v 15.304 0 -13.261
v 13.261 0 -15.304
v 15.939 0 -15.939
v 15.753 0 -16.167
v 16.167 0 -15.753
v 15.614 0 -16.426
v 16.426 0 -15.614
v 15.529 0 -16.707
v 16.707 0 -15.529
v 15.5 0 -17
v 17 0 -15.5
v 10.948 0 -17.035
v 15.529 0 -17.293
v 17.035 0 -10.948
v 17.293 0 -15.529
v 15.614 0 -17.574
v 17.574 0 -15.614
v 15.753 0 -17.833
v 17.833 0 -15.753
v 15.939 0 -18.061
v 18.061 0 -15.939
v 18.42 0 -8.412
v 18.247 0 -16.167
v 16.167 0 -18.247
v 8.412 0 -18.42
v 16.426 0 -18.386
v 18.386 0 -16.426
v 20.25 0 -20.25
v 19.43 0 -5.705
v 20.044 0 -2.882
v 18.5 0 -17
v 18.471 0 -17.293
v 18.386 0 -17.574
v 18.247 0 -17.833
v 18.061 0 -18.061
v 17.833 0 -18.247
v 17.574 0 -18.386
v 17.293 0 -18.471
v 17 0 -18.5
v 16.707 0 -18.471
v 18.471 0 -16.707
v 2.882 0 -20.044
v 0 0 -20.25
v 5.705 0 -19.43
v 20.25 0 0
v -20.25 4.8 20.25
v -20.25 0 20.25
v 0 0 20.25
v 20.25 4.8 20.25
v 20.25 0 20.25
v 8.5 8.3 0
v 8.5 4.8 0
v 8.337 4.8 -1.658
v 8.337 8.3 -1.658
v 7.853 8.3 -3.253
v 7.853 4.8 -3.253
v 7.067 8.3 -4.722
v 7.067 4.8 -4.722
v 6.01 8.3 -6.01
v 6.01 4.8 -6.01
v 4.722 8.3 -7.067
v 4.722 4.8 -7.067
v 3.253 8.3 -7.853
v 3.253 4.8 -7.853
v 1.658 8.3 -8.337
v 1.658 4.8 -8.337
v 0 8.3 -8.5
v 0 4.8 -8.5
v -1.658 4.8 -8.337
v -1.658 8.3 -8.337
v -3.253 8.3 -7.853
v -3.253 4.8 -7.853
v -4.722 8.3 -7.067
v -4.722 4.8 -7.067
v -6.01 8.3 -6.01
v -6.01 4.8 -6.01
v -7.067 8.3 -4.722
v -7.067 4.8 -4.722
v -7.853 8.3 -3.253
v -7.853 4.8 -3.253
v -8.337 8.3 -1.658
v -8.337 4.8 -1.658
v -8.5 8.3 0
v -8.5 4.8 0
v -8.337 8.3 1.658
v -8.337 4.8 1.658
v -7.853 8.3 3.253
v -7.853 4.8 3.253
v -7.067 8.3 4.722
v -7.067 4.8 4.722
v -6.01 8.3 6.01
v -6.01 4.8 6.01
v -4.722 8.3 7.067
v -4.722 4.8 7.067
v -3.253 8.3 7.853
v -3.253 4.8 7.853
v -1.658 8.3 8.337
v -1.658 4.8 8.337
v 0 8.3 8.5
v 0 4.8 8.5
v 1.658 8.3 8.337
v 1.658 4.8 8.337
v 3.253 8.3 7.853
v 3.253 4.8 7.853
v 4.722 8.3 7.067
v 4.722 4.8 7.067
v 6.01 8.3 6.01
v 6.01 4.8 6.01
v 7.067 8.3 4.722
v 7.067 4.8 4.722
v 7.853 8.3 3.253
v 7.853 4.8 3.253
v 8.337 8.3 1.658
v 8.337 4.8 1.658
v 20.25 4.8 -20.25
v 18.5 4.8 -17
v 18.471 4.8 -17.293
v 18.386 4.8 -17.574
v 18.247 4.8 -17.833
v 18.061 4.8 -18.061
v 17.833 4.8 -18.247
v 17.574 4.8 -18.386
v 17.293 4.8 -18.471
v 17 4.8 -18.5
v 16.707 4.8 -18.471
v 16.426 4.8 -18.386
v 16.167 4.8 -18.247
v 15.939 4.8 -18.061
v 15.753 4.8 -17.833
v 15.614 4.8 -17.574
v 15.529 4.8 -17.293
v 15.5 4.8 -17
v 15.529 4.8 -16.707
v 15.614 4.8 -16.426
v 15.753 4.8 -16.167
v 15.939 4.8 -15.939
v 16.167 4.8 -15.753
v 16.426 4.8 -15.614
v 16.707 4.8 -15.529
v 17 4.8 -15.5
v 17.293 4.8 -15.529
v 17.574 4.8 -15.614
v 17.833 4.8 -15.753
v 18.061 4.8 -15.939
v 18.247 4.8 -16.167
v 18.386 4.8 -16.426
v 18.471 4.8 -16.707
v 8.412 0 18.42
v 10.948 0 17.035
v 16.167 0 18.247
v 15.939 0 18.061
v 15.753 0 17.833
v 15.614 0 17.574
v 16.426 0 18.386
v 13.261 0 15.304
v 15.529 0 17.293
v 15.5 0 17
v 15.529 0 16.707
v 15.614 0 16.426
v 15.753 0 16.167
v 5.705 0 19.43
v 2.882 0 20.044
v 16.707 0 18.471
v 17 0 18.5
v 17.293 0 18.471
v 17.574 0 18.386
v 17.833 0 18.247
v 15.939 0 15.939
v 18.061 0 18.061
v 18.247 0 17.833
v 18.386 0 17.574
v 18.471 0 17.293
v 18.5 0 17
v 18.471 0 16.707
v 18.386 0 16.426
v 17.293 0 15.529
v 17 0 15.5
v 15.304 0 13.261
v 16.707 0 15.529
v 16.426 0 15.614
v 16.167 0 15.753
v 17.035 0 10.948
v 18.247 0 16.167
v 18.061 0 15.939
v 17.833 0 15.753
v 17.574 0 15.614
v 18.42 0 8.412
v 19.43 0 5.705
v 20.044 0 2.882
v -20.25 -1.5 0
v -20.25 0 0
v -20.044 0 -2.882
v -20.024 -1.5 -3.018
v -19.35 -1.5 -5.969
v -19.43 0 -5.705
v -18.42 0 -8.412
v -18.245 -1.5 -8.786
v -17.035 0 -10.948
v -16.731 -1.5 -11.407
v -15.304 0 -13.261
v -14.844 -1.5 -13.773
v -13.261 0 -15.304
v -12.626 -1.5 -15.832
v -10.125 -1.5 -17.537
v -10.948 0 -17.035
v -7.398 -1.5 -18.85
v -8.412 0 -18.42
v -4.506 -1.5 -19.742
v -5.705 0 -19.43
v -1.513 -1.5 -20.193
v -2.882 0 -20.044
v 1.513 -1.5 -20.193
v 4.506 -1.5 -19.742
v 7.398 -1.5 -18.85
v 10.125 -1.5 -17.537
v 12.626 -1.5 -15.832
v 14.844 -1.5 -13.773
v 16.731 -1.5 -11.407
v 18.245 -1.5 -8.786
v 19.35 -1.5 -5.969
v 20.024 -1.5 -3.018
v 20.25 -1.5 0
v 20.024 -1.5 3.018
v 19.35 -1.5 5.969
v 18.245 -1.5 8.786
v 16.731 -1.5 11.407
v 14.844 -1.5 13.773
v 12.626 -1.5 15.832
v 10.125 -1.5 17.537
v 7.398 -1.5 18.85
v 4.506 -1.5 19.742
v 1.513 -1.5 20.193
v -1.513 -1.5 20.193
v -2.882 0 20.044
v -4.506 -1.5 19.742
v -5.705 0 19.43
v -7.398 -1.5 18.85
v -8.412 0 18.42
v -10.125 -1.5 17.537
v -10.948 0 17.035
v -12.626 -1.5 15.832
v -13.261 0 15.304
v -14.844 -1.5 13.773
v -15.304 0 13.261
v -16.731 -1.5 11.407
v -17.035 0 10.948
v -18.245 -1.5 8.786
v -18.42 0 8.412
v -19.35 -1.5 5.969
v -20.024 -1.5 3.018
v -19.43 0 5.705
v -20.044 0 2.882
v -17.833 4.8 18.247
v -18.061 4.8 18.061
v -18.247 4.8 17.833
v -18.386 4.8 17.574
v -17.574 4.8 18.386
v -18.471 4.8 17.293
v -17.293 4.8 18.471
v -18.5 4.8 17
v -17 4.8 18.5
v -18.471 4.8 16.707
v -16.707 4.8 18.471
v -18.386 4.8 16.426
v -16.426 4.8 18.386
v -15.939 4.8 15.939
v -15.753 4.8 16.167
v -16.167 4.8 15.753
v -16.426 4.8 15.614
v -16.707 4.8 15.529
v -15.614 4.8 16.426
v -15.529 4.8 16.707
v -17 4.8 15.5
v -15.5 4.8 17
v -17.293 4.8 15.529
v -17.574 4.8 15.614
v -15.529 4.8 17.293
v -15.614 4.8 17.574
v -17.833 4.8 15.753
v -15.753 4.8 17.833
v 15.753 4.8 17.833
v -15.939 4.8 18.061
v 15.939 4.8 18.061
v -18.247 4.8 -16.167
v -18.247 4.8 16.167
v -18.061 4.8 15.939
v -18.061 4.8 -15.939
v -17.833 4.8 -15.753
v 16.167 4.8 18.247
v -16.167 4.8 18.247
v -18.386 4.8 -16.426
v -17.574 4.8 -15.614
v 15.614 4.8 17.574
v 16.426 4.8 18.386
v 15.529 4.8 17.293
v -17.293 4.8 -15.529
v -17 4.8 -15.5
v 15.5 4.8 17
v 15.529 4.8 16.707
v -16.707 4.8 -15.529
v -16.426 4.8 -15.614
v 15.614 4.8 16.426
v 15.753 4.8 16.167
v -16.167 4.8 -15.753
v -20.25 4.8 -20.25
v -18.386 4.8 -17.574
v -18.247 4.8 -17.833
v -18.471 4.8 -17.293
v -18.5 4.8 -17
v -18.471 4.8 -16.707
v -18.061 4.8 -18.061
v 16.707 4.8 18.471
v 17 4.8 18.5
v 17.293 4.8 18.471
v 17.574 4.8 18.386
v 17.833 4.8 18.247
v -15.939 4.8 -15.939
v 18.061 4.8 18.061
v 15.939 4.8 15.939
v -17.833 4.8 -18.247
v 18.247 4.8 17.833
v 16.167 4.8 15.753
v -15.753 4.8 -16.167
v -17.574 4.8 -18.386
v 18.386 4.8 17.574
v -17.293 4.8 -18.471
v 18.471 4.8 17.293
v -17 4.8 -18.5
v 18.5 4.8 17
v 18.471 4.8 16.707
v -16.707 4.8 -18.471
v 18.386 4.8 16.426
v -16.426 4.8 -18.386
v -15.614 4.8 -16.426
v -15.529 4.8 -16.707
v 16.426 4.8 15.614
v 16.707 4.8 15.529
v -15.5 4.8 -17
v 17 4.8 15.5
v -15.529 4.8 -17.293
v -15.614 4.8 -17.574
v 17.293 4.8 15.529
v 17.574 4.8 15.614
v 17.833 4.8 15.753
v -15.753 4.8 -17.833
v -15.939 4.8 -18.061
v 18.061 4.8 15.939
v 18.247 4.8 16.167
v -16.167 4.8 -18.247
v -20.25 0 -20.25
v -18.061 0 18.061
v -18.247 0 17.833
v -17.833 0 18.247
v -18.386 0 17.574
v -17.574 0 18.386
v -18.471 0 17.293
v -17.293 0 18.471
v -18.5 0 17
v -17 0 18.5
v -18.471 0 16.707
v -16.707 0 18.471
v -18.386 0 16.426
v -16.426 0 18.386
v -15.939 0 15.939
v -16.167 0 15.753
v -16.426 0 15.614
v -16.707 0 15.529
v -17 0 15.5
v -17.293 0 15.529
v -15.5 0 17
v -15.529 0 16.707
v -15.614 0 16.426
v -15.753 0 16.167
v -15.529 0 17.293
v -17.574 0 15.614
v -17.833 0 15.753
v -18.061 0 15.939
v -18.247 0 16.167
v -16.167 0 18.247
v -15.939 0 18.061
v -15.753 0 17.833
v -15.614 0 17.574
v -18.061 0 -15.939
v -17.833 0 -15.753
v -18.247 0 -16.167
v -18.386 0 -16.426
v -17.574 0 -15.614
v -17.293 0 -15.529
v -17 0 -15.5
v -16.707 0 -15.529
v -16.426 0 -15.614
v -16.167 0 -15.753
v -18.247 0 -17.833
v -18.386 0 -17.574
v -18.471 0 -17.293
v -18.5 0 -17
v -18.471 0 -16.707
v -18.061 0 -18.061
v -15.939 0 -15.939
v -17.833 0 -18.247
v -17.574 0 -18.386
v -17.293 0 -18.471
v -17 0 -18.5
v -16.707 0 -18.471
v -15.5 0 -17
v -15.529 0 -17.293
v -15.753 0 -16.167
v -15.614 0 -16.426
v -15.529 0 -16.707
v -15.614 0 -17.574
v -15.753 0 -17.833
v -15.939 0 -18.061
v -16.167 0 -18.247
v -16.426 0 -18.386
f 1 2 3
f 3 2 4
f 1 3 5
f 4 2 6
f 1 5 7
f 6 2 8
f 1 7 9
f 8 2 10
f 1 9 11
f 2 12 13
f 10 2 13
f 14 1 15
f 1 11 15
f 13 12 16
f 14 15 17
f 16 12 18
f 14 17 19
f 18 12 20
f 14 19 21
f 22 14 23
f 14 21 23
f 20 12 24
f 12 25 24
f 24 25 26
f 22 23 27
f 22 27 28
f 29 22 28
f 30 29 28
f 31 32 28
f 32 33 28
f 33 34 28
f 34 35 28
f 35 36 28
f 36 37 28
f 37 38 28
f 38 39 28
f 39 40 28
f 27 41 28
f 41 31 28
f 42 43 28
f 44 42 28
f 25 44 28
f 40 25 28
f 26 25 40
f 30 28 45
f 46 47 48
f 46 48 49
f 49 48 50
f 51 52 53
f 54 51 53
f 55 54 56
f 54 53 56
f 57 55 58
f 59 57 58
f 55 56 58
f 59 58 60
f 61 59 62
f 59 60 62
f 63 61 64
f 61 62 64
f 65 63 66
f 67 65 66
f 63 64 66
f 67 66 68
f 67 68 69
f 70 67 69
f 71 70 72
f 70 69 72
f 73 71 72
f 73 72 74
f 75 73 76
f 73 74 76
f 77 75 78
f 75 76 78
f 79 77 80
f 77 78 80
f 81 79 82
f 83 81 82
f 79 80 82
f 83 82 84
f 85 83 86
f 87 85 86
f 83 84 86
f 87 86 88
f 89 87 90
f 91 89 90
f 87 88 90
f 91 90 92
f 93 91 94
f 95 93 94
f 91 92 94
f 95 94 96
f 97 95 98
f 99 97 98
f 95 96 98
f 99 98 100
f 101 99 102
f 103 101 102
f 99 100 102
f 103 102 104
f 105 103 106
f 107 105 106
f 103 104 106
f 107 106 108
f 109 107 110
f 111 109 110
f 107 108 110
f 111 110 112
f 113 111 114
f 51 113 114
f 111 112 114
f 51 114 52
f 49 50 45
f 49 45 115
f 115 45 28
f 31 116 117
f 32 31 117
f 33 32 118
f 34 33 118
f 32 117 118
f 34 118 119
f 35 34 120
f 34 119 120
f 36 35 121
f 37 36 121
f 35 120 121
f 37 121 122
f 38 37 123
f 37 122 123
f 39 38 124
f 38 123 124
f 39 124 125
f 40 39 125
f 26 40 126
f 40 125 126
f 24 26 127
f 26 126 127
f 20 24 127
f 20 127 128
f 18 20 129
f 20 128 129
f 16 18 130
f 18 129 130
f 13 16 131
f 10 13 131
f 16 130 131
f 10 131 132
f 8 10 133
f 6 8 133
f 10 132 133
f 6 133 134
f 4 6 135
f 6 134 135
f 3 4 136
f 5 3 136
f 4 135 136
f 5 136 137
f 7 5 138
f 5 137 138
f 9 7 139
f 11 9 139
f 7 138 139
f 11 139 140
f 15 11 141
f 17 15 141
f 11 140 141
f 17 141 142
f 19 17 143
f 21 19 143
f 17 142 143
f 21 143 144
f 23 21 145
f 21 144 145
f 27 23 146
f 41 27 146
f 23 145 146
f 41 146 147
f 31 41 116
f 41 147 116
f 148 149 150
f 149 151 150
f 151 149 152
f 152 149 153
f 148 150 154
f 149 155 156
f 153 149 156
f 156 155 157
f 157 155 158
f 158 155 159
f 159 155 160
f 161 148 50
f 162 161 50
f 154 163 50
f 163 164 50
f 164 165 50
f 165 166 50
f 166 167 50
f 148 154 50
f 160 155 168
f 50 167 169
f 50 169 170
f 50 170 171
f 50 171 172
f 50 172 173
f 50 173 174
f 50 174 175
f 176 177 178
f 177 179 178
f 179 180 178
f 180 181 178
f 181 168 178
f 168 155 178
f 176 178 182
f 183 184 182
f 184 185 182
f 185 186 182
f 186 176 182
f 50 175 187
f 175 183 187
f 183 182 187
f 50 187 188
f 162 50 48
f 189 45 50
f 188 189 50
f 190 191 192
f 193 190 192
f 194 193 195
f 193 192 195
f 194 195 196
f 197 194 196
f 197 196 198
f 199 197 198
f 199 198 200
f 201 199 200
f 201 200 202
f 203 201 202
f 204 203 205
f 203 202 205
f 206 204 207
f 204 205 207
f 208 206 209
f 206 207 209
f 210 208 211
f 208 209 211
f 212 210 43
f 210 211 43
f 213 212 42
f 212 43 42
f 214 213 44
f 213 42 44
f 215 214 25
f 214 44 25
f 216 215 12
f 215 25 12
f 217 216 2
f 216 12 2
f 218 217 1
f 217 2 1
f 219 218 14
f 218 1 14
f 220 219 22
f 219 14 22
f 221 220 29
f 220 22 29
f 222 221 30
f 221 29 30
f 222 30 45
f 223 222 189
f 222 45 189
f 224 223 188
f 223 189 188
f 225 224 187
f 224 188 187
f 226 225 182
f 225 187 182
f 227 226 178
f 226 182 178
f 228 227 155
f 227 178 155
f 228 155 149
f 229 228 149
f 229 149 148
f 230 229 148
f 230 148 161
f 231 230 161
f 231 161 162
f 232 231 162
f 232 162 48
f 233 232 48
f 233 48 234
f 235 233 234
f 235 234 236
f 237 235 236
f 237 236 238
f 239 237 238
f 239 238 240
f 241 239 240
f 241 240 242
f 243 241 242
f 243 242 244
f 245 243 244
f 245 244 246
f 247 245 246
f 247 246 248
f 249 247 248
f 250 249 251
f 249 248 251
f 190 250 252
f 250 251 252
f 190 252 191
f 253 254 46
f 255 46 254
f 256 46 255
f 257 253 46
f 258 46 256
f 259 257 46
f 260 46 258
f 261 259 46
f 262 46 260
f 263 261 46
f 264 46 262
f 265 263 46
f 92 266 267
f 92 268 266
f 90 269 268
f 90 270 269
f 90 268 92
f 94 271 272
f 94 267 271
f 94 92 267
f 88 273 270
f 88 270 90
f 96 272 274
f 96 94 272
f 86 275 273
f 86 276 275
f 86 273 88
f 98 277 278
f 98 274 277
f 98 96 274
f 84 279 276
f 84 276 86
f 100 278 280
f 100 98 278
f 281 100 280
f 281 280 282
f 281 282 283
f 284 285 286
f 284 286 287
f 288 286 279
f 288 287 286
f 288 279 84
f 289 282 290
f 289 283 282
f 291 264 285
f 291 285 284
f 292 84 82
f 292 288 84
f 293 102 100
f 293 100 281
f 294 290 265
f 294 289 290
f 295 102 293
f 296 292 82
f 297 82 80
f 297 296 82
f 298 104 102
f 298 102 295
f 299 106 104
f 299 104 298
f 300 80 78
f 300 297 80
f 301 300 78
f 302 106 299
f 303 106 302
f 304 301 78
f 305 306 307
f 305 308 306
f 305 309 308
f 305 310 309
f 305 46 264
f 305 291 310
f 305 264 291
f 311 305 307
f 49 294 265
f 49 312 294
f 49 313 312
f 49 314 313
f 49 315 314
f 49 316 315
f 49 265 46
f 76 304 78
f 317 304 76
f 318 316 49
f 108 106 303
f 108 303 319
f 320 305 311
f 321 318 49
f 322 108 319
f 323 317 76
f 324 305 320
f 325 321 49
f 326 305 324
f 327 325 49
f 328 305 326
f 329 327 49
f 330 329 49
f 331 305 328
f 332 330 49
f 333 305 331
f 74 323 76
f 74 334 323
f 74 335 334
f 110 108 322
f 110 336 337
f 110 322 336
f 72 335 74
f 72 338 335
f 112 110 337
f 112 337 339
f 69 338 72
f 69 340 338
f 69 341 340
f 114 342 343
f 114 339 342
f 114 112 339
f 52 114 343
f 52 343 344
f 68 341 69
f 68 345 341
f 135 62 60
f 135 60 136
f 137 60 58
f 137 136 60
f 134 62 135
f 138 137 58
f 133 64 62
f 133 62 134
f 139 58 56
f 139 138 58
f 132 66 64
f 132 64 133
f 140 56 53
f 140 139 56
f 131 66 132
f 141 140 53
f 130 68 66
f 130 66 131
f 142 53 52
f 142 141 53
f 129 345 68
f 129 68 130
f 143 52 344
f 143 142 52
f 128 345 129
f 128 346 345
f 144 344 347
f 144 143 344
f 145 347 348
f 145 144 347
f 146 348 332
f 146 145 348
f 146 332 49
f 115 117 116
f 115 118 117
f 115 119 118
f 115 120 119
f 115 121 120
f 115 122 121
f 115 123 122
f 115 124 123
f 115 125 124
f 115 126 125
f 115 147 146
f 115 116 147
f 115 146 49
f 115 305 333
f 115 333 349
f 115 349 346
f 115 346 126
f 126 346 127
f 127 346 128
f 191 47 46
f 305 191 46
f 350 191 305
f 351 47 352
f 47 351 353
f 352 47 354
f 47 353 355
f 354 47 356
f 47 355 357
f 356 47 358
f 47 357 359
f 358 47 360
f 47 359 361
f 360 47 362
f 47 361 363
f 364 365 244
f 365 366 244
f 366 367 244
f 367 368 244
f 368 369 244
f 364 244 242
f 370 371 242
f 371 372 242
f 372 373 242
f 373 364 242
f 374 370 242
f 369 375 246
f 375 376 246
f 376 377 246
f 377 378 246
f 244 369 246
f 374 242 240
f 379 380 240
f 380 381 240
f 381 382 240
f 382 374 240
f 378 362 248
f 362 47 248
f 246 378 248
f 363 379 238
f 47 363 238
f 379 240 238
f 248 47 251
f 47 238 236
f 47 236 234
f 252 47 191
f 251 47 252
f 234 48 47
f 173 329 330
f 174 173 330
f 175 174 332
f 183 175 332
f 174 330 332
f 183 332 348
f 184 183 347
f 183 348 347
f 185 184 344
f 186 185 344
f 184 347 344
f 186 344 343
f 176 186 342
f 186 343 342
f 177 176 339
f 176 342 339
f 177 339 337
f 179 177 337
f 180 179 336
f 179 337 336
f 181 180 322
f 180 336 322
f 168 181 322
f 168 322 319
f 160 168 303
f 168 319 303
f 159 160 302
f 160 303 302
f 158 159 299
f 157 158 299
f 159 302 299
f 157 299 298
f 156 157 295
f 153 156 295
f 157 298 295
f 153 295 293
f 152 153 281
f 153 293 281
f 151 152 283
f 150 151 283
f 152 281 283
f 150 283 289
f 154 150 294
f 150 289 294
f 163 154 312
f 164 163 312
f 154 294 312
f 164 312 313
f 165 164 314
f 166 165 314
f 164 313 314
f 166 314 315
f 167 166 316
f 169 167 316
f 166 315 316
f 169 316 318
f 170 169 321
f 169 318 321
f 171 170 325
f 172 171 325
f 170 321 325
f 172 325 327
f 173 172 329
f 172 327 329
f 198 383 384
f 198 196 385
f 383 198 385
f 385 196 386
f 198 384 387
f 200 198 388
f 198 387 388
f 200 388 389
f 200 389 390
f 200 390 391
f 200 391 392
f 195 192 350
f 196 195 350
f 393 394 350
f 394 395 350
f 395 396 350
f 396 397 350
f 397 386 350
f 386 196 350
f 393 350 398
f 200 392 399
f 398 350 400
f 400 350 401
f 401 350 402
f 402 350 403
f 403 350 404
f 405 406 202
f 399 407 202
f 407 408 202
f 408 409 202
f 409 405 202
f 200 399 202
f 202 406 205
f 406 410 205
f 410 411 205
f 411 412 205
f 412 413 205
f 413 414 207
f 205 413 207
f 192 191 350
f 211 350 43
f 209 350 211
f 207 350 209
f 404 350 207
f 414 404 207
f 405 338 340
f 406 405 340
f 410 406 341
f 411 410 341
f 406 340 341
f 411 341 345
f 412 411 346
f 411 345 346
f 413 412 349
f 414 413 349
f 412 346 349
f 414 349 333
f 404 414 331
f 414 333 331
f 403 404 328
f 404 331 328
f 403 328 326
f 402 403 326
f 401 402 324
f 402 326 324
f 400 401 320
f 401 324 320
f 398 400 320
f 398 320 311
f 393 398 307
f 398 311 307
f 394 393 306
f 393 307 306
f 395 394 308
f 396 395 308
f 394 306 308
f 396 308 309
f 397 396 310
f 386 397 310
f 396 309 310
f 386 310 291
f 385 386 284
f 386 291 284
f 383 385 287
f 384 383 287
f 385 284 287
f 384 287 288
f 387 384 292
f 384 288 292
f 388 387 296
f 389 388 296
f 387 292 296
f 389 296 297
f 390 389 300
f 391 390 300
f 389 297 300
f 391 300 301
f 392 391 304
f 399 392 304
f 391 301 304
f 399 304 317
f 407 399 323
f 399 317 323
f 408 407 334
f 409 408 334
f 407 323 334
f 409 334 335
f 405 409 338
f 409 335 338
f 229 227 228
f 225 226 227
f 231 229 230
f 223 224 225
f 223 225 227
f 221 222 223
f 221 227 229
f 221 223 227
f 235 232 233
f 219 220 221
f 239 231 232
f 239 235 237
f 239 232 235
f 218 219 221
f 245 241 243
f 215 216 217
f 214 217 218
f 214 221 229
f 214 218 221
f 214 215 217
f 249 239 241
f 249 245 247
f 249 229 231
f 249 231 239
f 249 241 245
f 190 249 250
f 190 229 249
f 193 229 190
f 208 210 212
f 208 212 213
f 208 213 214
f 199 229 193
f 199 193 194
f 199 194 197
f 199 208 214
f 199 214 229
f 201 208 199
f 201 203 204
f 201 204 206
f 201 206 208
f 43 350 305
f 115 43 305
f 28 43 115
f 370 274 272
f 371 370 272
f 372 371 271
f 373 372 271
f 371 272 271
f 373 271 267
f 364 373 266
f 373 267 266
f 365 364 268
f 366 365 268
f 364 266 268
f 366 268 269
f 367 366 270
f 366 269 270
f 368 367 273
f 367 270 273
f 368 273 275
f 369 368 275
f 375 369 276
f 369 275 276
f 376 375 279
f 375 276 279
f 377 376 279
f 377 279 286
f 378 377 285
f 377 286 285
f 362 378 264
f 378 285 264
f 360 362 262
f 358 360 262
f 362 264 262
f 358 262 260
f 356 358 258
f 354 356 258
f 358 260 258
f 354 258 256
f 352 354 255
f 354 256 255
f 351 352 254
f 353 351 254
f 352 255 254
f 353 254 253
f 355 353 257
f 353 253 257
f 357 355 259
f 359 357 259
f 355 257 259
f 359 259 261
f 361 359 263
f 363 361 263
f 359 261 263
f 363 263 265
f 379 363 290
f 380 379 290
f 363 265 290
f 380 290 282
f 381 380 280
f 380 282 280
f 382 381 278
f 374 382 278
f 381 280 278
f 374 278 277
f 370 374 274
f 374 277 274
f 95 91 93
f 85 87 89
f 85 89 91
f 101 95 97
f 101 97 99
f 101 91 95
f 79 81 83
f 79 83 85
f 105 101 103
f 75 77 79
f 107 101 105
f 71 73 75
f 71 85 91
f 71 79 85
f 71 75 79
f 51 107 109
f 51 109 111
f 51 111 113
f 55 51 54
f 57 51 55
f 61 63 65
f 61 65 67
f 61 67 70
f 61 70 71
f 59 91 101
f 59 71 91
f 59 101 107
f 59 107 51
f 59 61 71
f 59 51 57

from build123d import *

# Parameters (mm, degrees)
SKETCH1_W           = 40.5
SKETCH1_H           = 40.5
BOSS_EXTRUDE1_DEPTH = 4.8
SKETCH2_R           = 8.5
BOSS_EXTRUDE2_DEPTH = 3.5
SKETCH3_R           = 1.5
CUT_EXTRUDE1_DEPTH  = 4.8
SKETCH4_R           = 20.25
BOSS_EXTRUDE3_DEPTH = 1.5


with BuildPart() as part:
    # Sketch1 → Boss-Extrude1 (new body)
    with BuildSketch(Plane(origin=(0, 0, 0), x_dir=(1, 0, 0), z_dir=(0, 1, 0))):
        Rectangle(SKETCH1_W, SKETCH1_H)
    extrude(amount=BOSS_EXTRUDE1_DEPTH)

    # Sketch2 → Boss-Extrude2 (add)
    with BuildSketch(Plane(origin=(0, 4.8, 0), x_dir=(1, 0, 0), z_dir=(0, 1, 0))):
        Circle(SKETCH2_R)
    extrude(amount=BOSS_EXTRUDE2_DEPTH)

    # Sketch3 → Cut-Extrude1 (cut)
    with BuildSketch(Plane(origin=(0, 4.8, 0), x_dir=(1, 0, 0), z_dir=(0, 1, 0))):
        with Locations((17, 17)):
            Circle(SKETCH3_R)
        with Locations((-17, 17)):
            Circle(SKETCH3_R)
        with Locations((-17, -17)):
            Circle(SKETCH3_R)
        with Locations((17, -17)):
            Circle(SKETCH3_R)
    extrude(amount=-CUT_EXTRUDE1_DEPTH, mode=Mode.SUBTRACT)

    # Sketch4 → Boss-Extrude3 (add)
    with BuildSketch(Plane(origin=(0, 0, 0), x_dir=(-1, 0, 0), z_dir=(0, -1, 0))):
        Circle(SKETCH4_R)
    extrude(amount=BOSS_EXTRUDE3_DEPTH)


solid = part.part
